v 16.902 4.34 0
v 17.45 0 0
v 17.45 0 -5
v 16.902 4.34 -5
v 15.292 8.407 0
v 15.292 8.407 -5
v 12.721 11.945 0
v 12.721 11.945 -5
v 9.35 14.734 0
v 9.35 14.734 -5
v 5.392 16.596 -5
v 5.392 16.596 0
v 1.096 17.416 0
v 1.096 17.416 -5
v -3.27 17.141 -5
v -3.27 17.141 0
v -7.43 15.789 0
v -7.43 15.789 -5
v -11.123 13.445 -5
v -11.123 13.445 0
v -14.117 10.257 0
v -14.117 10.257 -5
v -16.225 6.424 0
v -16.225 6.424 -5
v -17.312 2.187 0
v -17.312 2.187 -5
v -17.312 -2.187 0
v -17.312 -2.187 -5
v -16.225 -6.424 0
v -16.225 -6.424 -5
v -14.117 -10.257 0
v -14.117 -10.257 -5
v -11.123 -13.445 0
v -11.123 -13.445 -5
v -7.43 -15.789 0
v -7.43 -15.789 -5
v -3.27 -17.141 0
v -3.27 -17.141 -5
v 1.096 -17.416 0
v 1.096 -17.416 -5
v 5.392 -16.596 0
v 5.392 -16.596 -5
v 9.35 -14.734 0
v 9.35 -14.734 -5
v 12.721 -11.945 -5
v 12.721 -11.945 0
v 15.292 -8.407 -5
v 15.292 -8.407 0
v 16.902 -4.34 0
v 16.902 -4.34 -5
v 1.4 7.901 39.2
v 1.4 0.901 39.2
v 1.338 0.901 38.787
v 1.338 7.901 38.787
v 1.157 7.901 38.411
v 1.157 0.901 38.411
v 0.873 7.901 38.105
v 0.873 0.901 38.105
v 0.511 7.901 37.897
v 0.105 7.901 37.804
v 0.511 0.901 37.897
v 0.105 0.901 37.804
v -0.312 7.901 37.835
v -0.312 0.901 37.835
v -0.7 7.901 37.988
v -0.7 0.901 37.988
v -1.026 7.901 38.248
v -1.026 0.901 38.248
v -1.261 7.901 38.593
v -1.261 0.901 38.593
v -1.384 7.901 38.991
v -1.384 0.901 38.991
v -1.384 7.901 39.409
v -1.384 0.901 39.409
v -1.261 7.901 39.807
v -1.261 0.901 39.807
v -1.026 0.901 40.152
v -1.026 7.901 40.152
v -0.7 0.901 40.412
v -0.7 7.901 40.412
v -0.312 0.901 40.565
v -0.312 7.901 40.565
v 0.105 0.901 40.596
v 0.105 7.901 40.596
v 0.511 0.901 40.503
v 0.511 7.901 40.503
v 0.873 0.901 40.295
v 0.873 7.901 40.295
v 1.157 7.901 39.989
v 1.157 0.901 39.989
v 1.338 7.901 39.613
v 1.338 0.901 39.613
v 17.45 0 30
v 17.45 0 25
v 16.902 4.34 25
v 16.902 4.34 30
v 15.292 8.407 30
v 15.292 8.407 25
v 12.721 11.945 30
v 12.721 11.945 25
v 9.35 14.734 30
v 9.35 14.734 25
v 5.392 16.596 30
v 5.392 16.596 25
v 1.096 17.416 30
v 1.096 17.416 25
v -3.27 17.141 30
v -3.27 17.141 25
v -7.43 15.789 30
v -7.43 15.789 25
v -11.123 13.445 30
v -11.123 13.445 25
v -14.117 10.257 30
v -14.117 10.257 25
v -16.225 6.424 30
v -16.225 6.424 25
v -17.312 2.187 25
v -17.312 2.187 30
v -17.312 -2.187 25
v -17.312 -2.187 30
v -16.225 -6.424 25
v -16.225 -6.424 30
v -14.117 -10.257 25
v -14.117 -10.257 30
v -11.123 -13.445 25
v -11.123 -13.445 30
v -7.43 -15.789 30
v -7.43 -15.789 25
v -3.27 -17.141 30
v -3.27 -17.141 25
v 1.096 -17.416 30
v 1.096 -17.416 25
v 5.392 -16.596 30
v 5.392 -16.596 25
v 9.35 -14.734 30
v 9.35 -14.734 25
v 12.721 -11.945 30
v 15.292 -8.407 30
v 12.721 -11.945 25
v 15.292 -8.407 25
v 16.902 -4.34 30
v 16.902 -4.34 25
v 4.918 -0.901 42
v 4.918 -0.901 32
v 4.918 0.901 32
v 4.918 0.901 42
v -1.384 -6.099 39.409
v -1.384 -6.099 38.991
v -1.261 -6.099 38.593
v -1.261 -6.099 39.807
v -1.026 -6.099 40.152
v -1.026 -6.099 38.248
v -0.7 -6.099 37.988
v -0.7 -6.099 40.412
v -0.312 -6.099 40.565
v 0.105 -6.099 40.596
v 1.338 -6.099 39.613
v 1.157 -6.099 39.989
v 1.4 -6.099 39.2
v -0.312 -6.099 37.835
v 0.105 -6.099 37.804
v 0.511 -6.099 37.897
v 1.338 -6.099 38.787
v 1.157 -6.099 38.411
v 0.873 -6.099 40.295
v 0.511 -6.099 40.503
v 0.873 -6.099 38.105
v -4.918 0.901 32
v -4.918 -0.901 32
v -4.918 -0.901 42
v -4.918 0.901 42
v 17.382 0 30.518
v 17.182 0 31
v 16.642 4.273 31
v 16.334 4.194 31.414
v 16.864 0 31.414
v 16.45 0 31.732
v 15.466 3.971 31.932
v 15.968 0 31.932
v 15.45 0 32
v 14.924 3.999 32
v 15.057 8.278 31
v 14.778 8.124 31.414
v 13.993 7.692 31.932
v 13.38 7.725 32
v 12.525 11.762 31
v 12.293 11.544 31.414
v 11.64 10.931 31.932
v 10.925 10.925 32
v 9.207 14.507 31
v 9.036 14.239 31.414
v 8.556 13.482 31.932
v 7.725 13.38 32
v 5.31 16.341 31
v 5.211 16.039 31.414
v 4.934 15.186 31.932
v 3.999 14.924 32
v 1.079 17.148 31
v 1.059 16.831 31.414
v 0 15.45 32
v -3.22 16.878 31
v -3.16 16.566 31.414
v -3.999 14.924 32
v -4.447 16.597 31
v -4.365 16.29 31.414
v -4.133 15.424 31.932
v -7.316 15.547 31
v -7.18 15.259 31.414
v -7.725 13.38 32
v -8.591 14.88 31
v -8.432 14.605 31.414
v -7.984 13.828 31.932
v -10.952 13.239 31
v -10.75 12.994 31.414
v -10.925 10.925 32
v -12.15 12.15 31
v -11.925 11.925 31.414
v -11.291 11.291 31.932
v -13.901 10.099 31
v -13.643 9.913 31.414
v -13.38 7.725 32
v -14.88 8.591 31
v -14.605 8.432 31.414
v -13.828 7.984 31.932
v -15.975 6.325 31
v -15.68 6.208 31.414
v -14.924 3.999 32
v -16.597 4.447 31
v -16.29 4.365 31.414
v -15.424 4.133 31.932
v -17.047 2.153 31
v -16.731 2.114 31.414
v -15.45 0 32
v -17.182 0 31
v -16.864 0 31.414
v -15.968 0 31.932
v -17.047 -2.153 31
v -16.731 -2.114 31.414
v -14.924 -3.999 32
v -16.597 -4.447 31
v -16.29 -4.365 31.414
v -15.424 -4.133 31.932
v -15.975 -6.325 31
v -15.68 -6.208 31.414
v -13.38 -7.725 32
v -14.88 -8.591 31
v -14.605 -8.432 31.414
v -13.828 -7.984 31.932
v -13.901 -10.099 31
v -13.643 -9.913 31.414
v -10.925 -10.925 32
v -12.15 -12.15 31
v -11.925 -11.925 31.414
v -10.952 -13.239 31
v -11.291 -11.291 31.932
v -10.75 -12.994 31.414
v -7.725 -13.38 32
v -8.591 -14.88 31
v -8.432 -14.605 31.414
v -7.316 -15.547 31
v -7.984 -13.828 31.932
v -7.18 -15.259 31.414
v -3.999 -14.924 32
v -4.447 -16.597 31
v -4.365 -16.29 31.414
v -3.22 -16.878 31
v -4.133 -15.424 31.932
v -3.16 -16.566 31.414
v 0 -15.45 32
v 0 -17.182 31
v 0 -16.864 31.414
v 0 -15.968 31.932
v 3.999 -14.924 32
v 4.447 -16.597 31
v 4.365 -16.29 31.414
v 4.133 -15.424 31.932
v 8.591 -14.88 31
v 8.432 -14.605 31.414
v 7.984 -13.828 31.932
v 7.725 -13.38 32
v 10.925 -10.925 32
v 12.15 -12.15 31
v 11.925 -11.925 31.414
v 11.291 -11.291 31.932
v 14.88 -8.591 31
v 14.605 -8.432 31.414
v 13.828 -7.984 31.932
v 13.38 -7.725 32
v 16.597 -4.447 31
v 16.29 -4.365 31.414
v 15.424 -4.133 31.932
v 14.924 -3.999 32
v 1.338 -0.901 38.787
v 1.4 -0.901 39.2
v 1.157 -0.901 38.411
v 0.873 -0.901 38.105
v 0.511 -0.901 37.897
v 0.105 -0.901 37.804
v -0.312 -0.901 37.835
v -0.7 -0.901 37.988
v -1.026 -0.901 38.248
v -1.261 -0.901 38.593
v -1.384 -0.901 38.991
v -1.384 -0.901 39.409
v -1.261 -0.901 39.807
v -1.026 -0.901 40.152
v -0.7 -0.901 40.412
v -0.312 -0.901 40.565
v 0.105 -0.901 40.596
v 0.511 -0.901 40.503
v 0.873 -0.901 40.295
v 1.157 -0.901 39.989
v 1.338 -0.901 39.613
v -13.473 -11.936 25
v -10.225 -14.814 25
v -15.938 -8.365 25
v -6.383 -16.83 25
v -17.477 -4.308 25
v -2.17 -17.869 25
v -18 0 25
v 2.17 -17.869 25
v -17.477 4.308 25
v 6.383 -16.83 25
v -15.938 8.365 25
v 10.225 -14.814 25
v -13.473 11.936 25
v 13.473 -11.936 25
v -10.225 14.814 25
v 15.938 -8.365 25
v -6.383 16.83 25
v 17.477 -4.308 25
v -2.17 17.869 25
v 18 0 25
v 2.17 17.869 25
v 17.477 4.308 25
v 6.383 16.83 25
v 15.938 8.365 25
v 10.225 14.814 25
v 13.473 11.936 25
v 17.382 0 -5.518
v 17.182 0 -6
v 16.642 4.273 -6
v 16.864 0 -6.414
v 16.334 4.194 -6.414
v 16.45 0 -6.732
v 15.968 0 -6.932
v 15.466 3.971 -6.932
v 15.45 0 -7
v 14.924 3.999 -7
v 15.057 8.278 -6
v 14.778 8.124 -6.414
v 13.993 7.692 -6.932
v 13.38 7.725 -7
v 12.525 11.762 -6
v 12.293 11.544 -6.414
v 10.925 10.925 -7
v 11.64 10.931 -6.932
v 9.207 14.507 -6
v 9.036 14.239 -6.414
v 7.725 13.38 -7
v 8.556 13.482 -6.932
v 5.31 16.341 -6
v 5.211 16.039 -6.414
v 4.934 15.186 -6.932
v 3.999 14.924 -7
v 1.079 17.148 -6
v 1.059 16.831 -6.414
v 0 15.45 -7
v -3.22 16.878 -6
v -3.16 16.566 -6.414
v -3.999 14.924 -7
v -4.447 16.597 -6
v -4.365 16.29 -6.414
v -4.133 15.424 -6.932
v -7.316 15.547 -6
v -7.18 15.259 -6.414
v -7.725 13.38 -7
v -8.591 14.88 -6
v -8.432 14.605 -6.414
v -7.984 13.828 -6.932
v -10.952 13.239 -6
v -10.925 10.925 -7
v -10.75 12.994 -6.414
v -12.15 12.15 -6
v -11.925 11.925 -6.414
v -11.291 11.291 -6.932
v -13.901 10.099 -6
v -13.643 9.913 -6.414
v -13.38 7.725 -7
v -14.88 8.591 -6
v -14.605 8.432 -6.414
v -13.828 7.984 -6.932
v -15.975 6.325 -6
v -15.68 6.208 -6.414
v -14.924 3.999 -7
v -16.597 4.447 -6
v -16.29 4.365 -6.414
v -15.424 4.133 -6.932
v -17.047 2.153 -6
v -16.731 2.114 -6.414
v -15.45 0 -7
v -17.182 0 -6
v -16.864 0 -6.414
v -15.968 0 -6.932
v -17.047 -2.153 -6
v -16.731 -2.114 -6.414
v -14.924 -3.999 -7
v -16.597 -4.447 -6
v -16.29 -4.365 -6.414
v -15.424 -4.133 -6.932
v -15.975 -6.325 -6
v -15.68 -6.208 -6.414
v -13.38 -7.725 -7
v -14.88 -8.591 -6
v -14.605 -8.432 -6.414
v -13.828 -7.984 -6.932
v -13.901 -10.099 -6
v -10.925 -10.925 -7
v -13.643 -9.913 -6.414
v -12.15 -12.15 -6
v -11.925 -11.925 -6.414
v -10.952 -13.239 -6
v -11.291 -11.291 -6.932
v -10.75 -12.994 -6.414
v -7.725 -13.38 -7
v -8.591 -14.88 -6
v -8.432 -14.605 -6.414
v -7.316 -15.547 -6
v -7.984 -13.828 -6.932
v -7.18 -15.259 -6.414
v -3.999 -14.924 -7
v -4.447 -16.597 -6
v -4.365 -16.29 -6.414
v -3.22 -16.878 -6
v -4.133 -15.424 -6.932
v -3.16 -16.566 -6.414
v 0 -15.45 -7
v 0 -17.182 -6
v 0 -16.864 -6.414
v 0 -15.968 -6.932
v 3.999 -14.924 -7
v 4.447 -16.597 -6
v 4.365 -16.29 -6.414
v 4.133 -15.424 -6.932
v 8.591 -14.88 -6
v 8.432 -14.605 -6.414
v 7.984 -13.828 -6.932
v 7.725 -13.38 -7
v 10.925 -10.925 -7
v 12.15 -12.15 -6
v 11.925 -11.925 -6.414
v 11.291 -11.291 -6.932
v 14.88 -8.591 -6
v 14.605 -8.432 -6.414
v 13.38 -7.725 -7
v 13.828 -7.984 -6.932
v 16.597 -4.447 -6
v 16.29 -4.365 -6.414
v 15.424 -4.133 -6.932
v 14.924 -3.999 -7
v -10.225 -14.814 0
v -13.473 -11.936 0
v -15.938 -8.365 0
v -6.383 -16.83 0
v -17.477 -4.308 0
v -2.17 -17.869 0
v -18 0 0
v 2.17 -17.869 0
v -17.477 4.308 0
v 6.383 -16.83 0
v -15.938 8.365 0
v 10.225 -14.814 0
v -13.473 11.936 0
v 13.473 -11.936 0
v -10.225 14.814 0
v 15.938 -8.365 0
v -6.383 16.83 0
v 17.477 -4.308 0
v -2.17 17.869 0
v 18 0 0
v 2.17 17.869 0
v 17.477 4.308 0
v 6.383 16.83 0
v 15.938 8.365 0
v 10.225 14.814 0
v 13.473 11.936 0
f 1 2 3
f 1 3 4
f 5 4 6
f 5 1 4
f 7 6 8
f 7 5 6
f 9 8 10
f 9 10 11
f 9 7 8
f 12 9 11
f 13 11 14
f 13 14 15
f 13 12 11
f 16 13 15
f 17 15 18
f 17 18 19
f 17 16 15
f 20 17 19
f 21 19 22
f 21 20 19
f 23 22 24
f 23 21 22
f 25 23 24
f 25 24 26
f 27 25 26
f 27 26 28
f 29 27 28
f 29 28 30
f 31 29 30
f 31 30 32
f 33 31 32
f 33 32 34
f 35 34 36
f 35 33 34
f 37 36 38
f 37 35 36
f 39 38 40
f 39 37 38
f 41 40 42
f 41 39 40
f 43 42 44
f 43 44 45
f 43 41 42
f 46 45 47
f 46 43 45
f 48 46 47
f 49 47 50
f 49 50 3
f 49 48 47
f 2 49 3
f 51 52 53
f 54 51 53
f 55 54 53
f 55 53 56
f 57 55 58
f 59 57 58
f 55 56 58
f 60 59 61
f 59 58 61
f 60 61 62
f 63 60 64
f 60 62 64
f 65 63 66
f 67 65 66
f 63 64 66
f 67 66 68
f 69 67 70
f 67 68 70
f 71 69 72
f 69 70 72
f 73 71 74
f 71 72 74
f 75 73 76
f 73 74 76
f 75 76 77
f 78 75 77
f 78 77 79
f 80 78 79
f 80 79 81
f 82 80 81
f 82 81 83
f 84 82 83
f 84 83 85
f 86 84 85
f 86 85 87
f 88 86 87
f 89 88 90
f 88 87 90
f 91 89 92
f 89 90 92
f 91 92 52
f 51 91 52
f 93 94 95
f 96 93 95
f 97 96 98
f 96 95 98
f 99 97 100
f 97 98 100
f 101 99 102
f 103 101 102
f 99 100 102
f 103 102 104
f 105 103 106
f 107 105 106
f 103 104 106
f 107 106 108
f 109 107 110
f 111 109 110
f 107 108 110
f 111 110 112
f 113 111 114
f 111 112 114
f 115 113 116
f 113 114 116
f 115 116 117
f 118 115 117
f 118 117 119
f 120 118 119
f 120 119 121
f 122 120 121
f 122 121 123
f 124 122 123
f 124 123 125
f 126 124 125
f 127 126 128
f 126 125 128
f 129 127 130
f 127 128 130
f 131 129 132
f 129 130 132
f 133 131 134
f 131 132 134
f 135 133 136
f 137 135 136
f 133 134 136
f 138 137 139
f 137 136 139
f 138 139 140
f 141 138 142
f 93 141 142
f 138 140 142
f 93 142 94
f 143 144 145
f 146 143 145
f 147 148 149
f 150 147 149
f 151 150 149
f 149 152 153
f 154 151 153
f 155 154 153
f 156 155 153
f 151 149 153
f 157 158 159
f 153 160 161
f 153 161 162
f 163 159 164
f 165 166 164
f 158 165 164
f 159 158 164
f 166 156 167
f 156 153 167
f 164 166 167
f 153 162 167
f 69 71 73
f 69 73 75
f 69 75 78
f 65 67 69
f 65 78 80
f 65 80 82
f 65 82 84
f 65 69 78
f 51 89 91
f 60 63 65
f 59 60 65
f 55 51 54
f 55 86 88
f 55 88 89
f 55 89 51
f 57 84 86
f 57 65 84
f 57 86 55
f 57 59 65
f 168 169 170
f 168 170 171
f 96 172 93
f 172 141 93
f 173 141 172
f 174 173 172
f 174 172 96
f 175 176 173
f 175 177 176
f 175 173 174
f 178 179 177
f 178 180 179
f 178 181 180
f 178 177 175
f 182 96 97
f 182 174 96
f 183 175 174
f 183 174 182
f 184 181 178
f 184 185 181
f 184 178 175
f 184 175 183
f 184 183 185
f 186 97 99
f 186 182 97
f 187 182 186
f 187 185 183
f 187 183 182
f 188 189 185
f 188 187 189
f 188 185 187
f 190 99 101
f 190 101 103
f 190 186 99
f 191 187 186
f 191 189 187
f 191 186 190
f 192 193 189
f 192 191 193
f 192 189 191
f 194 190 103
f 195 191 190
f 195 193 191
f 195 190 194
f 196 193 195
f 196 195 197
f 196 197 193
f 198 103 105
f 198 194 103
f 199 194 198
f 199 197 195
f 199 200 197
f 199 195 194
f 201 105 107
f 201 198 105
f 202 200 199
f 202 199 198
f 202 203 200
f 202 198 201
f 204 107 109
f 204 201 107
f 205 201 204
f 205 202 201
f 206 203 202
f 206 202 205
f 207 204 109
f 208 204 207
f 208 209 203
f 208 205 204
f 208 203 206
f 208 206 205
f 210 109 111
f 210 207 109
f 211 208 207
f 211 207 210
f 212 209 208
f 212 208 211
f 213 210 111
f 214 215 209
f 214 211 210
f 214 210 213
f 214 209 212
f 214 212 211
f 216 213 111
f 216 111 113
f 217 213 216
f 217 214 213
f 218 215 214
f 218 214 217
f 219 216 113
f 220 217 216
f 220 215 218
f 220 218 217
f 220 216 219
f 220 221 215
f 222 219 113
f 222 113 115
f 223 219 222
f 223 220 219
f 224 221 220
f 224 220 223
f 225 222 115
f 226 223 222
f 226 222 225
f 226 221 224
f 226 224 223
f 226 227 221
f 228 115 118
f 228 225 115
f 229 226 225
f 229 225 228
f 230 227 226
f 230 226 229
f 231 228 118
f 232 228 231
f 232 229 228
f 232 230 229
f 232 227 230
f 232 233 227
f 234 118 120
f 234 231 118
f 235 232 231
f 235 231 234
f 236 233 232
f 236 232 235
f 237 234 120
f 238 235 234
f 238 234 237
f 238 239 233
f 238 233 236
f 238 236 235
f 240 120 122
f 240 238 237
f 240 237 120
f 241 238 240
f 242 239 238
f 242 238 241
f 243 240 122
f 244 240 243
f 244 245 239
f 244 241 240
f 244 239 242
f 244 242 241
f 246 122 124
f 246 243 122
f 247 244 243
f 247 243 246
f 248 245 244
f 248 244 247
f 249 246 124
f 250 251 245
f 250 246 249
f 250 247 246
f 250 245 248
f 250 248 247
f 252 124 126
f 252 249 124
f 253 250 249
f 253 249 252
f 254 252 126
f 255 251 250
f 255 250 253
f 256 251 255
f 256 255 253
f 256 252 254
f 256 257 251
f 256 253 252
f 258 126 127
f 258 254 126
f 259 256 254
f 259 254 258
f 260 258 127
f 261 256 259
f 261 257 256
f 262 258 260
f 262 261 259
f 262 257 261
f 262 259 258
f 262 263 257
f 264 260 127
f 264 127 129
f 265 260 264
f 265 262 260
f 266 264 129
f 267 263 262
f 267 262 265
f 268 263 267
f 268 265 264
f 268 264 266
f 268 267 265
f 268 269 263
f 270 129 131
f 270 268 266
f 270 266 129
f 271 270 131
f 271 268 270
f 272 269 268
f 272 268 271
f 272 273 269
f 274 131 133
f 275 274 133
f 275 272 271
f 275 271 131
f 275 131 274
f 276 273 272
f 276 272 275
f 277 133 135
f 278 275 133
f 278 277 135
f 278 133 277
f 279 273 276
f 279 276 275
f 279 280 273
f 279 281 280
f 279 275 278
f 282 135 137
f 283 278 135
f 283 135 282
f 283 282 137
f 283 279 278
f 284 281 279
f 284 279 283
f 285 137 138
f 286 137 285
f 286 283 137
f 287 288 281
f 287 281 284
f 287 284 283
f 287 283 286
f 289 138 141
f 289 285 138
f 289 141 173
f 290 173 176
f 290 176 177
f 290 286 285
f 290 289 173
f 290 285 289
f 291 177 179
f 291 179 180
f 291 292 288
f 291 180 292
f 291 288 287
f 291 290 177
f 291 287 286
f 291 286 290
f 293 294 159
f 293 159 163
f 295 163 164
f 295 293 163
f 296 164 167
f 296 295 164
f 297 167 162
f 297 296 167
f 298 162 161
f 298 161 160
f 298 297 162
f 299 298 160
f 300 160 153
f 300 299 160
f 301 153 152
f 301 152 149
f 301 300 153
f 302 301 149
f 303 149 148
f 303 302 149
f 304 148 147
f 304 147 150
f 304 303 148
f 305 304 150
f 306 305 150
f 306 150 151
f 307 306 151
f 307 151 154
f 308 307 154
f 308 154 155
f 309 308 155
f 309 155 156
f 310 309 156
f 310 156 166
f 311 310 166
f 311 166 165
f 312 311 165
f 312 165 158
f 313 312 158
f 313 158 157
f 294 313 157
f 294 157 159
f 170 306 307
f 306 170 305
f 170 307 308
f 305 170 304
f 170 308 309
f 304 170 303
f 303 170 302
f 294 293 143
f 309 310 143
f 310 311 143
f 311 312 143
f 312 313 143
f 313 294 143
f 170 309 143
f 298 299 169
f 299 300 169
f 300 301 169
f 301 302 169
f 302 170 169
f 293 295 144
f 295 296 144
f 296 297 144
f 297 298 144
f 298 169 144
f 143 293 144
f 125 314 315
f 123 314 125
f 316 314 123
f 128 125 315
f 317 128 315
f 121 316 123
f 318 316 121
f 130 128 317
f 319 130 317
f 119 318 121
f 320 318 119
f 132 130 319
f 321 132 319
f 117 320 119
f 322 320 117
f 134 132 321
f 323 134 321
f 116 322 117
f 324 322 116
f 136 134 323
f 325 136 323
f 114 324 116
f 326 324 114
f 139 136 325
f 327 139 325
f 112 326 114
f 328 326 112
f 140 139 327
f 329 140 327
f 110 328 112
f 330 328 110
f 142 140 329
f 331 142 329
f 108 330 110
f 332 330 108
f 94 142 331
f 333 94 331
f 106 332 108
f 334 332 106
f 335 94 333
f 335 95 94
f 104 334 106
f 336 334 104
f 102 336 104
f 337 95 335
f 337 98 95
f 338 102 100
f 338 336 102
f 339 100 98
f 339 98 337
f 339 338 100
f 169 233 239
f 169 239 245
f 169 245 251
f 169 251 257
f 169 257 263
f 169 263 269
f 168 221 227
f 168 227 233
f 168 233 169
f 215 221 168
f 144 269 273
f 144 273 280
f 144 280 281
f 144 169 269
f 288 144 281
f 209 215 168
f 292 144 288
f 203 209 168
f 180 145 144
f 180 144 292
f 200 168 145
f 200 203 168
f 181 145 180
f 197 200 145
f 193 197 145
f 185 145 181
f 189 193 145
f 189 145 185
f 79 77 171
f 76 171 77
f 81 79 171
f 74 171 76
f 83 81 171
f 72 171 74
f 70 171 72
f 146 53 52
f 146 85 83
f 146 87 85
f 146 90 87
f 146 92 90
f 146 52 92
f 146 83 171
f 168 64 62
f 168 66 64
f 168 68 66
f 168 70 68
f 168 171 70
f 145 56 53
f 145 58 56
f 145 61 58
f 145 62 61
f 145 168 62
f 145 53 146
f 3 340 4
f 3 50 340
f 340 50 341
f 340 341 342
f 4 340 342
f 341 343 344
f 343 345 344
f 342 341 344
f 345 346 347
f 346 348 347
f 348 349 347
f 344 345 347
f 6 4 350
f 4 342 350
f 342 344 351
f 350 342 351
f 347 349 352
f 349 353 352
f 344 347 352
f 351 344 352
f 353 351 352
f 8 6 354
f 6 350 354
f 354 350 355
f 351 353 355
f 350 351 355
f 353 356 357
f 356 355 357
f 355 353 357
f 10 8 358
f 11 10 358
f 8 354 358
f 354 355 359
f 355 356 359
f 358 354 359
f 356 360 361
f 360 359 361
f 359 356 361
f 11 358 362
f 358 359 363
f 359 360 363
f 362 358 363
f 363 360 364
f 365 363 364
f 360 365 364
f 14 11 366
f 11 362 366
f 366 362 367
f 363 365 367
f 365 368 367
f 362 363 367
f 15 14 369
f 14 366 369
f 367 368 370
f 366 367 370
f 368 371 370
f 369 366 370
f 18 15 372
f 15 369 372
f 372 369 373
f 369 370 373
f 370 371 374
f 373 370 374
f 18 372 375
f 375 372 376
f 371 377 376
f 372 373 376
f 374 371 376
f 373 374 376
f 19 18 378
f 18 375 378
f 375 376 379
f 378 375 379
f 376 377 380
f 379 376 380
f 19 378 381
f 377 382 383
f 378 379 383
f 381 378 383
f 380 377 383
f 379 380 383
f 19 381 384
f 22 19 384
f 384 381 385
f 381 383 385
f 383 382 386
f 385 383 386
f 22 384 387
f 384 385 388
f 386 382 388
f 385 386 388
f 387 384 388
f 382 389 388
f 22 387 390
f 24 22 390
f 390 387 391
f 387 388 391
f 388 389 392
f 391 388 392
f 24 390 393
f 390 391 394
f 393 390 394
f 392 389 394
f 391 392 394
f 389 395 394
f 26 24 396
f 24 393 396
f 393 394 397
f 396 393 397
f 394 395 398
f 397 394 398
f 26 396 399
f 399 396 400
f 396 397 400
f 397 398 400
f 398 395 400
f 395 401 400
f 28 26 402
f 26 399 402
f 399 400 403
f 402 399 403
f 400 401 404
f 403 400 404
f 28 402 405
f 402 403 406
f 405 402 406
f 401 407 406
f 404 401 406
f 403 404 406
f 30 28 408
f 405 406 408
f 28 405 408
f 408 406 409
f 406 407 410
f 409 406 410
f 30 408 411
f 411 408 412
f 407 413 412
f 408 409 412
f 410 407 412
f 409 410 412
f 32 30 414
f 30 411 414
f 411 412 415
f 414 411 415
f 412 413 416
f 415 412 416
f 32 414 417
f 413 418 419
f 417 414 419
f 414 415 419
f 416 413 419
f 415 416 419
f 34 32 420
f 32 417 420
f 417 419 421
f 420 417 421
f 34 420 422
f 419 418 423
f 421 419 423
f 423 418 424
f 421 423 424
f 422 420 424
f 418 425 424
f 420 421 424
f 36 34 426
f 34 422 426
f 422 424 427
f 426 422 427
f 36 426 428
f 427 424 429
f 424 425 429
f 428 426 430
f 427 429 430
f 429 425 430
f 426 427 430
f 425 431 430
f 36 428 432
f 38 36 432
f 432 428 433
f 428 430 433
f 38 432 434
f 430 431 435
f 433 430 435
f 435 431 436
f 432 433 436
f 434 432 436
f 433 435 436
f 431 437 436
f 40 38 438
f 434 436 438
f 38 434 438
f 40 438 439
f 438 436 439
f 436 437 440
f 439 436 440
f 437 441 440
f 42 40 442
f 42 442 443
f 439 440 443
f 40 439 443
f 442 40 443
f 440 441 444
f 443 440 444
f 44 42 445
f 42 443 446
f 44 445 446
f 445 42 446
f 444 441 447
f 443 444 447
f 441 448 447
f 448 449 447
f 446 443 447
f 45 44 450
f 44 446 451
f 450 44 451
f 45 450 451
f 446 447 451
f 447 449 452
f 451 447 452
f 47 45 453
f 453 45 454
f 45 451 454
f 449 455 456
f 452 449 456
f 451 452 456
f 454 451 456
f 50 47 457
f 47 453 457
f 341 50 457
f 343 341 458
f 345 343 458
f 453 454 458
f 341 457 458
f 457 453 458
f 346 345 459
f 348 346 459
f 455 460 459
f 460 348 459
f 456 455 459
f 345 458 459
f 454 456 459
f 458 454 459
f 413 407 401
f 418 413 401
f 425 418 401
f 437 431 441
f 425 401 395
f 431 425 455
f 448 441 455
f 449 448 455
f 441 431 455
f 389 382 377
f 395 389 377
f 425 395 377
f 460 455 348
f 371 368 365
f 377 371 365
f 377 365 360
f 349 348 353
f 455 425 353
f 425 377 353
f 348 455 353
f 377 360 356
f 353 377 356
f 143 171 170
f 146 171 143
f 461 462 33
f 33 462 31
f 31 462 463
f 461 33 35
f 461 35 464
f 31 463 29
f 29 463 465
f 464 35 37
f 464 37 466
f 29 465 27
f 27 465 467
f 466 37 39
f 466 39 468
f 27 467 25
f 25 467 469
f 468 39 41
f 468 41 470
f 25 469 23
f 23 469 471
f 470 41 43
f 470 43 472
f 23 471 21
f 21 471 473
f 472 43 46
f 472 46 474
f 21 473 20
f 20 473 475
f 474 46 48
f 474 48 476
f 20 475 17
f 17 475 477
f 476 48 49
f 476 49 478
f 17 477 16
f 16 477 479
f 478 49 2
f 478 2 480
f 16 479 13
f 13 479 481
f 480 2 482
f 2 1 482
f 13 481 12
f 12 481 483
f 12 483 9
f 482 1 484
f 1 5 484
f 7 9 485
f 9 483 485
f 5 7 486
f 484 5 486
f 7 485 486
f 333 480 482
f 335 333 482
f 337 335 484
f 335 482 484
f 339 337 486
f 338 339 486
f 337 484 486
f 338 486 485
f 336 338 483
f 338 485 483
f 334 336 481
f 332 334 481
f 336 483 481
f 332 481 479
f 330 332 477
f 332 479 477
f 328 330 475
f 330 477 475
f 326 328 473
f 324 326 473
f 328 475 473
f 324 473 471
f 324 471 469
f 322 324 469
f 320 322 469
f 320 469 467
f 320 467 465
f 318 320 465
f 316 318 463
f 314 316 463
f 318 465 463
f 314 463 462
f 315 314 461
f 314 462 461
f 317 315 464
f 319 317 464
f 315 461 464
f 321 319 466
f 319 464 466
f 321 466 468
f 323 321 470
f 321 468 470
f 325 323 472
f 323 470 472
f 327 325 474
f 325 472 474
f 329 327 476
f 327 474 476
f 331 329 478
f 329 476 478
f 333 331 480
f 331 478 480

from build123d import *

# Parameters (mm, degrees)
SKETCH1_R                = 18
BOSS_EXTRUDE3_DEPTH      = 25
SKETCH2_R                = 17.45
BOSS_EXTRUDE4_DEPTH      = 7
BOSS_EXTRUDE5_START      = -32
SKETCH2_2_R              = 17.45
BOSS_EXTRUDE5_DEPTH      = 7
FILLET1_R                = 2
FILLET2_R                = 2
SKETCH7_W                = 9.836471502
SKETCH7_H                = 1.801063134
BOSS_EXTRUDE7_DEPTH      = 10
BOSS_EXTRUDE9_DEPTH      = 7
BOSS_EXTRUDE9_DEPTH_BACK = 7
SKETCH8_R                = 1.4


with BuildPart() as part:
    # Sketch1 → Boss-Extrude3 (new body)
    with BuildSketch(Plane.XY):
        Circle(SKETCH1_R)
    extrude(amount=BOSS_EXTRUDE3_DEPTH)

    # Sketch2 → Boss-Extrude4 (add)
    with BuildSketch(Plane.XY.offset(25)):
        Circle(SKETCH2_R)
    extrude(amount=BOSS_EXTRUDE4_DEPTH)

    # Sketch2<2> → Boss-Extrude5 (add)
    with BuildSketch(Plane.XY.offset(25).offset(BOSS_EXTRUDE5_START)):
        Circle(SKETCH2_2_R)
    extrude(amount=BOSS_EXTRUDE5_DEPTH)

    # Fillet1
    fillet1_edges = [part.edges().sort_by_distance(p)[0] for p in [
        (-17.45, 0, 32),
    ]]
    fillet(fillet1_edges, radius=FILLET1_R)

    # Fillet2
    fillet2_edges = [part.edges().sort_by_distance(p)[0] for p in [
        (-17.45, 0, -7),
    ]]
    fillet(fillet2_edges, radius=FILLET2_R)

    # Sketch7 → Boss-Extrude7 (add)
    with BuildSketch(Plane.XY.offset(32)):
        Rectangle(SKETCH7_W, SKETCH7_H)
    extrude(amount=BOSS_EXTRUDE7_DEPTH)

    # Sketch8 → Boss-Extrude9 (add, two sides: drawn at the far end of the back side and taken through both)
    with BuildSketch(Plane(origin=(0, 0.900531567, 0), x_dir=(1, 0, 0), z_dir=(0, 1, 0)).offset(-BOSS_EXTRUDE9_DEPTH_BACK)):
        with Locations((0, -39.2)):
            Circle(SKETCH8_R)
    extrude(amount=BOSS_EXTRUDE9_DEPTH + BOSS_EXTRUDE9_DEPTH_BACK)


solid = part.part
